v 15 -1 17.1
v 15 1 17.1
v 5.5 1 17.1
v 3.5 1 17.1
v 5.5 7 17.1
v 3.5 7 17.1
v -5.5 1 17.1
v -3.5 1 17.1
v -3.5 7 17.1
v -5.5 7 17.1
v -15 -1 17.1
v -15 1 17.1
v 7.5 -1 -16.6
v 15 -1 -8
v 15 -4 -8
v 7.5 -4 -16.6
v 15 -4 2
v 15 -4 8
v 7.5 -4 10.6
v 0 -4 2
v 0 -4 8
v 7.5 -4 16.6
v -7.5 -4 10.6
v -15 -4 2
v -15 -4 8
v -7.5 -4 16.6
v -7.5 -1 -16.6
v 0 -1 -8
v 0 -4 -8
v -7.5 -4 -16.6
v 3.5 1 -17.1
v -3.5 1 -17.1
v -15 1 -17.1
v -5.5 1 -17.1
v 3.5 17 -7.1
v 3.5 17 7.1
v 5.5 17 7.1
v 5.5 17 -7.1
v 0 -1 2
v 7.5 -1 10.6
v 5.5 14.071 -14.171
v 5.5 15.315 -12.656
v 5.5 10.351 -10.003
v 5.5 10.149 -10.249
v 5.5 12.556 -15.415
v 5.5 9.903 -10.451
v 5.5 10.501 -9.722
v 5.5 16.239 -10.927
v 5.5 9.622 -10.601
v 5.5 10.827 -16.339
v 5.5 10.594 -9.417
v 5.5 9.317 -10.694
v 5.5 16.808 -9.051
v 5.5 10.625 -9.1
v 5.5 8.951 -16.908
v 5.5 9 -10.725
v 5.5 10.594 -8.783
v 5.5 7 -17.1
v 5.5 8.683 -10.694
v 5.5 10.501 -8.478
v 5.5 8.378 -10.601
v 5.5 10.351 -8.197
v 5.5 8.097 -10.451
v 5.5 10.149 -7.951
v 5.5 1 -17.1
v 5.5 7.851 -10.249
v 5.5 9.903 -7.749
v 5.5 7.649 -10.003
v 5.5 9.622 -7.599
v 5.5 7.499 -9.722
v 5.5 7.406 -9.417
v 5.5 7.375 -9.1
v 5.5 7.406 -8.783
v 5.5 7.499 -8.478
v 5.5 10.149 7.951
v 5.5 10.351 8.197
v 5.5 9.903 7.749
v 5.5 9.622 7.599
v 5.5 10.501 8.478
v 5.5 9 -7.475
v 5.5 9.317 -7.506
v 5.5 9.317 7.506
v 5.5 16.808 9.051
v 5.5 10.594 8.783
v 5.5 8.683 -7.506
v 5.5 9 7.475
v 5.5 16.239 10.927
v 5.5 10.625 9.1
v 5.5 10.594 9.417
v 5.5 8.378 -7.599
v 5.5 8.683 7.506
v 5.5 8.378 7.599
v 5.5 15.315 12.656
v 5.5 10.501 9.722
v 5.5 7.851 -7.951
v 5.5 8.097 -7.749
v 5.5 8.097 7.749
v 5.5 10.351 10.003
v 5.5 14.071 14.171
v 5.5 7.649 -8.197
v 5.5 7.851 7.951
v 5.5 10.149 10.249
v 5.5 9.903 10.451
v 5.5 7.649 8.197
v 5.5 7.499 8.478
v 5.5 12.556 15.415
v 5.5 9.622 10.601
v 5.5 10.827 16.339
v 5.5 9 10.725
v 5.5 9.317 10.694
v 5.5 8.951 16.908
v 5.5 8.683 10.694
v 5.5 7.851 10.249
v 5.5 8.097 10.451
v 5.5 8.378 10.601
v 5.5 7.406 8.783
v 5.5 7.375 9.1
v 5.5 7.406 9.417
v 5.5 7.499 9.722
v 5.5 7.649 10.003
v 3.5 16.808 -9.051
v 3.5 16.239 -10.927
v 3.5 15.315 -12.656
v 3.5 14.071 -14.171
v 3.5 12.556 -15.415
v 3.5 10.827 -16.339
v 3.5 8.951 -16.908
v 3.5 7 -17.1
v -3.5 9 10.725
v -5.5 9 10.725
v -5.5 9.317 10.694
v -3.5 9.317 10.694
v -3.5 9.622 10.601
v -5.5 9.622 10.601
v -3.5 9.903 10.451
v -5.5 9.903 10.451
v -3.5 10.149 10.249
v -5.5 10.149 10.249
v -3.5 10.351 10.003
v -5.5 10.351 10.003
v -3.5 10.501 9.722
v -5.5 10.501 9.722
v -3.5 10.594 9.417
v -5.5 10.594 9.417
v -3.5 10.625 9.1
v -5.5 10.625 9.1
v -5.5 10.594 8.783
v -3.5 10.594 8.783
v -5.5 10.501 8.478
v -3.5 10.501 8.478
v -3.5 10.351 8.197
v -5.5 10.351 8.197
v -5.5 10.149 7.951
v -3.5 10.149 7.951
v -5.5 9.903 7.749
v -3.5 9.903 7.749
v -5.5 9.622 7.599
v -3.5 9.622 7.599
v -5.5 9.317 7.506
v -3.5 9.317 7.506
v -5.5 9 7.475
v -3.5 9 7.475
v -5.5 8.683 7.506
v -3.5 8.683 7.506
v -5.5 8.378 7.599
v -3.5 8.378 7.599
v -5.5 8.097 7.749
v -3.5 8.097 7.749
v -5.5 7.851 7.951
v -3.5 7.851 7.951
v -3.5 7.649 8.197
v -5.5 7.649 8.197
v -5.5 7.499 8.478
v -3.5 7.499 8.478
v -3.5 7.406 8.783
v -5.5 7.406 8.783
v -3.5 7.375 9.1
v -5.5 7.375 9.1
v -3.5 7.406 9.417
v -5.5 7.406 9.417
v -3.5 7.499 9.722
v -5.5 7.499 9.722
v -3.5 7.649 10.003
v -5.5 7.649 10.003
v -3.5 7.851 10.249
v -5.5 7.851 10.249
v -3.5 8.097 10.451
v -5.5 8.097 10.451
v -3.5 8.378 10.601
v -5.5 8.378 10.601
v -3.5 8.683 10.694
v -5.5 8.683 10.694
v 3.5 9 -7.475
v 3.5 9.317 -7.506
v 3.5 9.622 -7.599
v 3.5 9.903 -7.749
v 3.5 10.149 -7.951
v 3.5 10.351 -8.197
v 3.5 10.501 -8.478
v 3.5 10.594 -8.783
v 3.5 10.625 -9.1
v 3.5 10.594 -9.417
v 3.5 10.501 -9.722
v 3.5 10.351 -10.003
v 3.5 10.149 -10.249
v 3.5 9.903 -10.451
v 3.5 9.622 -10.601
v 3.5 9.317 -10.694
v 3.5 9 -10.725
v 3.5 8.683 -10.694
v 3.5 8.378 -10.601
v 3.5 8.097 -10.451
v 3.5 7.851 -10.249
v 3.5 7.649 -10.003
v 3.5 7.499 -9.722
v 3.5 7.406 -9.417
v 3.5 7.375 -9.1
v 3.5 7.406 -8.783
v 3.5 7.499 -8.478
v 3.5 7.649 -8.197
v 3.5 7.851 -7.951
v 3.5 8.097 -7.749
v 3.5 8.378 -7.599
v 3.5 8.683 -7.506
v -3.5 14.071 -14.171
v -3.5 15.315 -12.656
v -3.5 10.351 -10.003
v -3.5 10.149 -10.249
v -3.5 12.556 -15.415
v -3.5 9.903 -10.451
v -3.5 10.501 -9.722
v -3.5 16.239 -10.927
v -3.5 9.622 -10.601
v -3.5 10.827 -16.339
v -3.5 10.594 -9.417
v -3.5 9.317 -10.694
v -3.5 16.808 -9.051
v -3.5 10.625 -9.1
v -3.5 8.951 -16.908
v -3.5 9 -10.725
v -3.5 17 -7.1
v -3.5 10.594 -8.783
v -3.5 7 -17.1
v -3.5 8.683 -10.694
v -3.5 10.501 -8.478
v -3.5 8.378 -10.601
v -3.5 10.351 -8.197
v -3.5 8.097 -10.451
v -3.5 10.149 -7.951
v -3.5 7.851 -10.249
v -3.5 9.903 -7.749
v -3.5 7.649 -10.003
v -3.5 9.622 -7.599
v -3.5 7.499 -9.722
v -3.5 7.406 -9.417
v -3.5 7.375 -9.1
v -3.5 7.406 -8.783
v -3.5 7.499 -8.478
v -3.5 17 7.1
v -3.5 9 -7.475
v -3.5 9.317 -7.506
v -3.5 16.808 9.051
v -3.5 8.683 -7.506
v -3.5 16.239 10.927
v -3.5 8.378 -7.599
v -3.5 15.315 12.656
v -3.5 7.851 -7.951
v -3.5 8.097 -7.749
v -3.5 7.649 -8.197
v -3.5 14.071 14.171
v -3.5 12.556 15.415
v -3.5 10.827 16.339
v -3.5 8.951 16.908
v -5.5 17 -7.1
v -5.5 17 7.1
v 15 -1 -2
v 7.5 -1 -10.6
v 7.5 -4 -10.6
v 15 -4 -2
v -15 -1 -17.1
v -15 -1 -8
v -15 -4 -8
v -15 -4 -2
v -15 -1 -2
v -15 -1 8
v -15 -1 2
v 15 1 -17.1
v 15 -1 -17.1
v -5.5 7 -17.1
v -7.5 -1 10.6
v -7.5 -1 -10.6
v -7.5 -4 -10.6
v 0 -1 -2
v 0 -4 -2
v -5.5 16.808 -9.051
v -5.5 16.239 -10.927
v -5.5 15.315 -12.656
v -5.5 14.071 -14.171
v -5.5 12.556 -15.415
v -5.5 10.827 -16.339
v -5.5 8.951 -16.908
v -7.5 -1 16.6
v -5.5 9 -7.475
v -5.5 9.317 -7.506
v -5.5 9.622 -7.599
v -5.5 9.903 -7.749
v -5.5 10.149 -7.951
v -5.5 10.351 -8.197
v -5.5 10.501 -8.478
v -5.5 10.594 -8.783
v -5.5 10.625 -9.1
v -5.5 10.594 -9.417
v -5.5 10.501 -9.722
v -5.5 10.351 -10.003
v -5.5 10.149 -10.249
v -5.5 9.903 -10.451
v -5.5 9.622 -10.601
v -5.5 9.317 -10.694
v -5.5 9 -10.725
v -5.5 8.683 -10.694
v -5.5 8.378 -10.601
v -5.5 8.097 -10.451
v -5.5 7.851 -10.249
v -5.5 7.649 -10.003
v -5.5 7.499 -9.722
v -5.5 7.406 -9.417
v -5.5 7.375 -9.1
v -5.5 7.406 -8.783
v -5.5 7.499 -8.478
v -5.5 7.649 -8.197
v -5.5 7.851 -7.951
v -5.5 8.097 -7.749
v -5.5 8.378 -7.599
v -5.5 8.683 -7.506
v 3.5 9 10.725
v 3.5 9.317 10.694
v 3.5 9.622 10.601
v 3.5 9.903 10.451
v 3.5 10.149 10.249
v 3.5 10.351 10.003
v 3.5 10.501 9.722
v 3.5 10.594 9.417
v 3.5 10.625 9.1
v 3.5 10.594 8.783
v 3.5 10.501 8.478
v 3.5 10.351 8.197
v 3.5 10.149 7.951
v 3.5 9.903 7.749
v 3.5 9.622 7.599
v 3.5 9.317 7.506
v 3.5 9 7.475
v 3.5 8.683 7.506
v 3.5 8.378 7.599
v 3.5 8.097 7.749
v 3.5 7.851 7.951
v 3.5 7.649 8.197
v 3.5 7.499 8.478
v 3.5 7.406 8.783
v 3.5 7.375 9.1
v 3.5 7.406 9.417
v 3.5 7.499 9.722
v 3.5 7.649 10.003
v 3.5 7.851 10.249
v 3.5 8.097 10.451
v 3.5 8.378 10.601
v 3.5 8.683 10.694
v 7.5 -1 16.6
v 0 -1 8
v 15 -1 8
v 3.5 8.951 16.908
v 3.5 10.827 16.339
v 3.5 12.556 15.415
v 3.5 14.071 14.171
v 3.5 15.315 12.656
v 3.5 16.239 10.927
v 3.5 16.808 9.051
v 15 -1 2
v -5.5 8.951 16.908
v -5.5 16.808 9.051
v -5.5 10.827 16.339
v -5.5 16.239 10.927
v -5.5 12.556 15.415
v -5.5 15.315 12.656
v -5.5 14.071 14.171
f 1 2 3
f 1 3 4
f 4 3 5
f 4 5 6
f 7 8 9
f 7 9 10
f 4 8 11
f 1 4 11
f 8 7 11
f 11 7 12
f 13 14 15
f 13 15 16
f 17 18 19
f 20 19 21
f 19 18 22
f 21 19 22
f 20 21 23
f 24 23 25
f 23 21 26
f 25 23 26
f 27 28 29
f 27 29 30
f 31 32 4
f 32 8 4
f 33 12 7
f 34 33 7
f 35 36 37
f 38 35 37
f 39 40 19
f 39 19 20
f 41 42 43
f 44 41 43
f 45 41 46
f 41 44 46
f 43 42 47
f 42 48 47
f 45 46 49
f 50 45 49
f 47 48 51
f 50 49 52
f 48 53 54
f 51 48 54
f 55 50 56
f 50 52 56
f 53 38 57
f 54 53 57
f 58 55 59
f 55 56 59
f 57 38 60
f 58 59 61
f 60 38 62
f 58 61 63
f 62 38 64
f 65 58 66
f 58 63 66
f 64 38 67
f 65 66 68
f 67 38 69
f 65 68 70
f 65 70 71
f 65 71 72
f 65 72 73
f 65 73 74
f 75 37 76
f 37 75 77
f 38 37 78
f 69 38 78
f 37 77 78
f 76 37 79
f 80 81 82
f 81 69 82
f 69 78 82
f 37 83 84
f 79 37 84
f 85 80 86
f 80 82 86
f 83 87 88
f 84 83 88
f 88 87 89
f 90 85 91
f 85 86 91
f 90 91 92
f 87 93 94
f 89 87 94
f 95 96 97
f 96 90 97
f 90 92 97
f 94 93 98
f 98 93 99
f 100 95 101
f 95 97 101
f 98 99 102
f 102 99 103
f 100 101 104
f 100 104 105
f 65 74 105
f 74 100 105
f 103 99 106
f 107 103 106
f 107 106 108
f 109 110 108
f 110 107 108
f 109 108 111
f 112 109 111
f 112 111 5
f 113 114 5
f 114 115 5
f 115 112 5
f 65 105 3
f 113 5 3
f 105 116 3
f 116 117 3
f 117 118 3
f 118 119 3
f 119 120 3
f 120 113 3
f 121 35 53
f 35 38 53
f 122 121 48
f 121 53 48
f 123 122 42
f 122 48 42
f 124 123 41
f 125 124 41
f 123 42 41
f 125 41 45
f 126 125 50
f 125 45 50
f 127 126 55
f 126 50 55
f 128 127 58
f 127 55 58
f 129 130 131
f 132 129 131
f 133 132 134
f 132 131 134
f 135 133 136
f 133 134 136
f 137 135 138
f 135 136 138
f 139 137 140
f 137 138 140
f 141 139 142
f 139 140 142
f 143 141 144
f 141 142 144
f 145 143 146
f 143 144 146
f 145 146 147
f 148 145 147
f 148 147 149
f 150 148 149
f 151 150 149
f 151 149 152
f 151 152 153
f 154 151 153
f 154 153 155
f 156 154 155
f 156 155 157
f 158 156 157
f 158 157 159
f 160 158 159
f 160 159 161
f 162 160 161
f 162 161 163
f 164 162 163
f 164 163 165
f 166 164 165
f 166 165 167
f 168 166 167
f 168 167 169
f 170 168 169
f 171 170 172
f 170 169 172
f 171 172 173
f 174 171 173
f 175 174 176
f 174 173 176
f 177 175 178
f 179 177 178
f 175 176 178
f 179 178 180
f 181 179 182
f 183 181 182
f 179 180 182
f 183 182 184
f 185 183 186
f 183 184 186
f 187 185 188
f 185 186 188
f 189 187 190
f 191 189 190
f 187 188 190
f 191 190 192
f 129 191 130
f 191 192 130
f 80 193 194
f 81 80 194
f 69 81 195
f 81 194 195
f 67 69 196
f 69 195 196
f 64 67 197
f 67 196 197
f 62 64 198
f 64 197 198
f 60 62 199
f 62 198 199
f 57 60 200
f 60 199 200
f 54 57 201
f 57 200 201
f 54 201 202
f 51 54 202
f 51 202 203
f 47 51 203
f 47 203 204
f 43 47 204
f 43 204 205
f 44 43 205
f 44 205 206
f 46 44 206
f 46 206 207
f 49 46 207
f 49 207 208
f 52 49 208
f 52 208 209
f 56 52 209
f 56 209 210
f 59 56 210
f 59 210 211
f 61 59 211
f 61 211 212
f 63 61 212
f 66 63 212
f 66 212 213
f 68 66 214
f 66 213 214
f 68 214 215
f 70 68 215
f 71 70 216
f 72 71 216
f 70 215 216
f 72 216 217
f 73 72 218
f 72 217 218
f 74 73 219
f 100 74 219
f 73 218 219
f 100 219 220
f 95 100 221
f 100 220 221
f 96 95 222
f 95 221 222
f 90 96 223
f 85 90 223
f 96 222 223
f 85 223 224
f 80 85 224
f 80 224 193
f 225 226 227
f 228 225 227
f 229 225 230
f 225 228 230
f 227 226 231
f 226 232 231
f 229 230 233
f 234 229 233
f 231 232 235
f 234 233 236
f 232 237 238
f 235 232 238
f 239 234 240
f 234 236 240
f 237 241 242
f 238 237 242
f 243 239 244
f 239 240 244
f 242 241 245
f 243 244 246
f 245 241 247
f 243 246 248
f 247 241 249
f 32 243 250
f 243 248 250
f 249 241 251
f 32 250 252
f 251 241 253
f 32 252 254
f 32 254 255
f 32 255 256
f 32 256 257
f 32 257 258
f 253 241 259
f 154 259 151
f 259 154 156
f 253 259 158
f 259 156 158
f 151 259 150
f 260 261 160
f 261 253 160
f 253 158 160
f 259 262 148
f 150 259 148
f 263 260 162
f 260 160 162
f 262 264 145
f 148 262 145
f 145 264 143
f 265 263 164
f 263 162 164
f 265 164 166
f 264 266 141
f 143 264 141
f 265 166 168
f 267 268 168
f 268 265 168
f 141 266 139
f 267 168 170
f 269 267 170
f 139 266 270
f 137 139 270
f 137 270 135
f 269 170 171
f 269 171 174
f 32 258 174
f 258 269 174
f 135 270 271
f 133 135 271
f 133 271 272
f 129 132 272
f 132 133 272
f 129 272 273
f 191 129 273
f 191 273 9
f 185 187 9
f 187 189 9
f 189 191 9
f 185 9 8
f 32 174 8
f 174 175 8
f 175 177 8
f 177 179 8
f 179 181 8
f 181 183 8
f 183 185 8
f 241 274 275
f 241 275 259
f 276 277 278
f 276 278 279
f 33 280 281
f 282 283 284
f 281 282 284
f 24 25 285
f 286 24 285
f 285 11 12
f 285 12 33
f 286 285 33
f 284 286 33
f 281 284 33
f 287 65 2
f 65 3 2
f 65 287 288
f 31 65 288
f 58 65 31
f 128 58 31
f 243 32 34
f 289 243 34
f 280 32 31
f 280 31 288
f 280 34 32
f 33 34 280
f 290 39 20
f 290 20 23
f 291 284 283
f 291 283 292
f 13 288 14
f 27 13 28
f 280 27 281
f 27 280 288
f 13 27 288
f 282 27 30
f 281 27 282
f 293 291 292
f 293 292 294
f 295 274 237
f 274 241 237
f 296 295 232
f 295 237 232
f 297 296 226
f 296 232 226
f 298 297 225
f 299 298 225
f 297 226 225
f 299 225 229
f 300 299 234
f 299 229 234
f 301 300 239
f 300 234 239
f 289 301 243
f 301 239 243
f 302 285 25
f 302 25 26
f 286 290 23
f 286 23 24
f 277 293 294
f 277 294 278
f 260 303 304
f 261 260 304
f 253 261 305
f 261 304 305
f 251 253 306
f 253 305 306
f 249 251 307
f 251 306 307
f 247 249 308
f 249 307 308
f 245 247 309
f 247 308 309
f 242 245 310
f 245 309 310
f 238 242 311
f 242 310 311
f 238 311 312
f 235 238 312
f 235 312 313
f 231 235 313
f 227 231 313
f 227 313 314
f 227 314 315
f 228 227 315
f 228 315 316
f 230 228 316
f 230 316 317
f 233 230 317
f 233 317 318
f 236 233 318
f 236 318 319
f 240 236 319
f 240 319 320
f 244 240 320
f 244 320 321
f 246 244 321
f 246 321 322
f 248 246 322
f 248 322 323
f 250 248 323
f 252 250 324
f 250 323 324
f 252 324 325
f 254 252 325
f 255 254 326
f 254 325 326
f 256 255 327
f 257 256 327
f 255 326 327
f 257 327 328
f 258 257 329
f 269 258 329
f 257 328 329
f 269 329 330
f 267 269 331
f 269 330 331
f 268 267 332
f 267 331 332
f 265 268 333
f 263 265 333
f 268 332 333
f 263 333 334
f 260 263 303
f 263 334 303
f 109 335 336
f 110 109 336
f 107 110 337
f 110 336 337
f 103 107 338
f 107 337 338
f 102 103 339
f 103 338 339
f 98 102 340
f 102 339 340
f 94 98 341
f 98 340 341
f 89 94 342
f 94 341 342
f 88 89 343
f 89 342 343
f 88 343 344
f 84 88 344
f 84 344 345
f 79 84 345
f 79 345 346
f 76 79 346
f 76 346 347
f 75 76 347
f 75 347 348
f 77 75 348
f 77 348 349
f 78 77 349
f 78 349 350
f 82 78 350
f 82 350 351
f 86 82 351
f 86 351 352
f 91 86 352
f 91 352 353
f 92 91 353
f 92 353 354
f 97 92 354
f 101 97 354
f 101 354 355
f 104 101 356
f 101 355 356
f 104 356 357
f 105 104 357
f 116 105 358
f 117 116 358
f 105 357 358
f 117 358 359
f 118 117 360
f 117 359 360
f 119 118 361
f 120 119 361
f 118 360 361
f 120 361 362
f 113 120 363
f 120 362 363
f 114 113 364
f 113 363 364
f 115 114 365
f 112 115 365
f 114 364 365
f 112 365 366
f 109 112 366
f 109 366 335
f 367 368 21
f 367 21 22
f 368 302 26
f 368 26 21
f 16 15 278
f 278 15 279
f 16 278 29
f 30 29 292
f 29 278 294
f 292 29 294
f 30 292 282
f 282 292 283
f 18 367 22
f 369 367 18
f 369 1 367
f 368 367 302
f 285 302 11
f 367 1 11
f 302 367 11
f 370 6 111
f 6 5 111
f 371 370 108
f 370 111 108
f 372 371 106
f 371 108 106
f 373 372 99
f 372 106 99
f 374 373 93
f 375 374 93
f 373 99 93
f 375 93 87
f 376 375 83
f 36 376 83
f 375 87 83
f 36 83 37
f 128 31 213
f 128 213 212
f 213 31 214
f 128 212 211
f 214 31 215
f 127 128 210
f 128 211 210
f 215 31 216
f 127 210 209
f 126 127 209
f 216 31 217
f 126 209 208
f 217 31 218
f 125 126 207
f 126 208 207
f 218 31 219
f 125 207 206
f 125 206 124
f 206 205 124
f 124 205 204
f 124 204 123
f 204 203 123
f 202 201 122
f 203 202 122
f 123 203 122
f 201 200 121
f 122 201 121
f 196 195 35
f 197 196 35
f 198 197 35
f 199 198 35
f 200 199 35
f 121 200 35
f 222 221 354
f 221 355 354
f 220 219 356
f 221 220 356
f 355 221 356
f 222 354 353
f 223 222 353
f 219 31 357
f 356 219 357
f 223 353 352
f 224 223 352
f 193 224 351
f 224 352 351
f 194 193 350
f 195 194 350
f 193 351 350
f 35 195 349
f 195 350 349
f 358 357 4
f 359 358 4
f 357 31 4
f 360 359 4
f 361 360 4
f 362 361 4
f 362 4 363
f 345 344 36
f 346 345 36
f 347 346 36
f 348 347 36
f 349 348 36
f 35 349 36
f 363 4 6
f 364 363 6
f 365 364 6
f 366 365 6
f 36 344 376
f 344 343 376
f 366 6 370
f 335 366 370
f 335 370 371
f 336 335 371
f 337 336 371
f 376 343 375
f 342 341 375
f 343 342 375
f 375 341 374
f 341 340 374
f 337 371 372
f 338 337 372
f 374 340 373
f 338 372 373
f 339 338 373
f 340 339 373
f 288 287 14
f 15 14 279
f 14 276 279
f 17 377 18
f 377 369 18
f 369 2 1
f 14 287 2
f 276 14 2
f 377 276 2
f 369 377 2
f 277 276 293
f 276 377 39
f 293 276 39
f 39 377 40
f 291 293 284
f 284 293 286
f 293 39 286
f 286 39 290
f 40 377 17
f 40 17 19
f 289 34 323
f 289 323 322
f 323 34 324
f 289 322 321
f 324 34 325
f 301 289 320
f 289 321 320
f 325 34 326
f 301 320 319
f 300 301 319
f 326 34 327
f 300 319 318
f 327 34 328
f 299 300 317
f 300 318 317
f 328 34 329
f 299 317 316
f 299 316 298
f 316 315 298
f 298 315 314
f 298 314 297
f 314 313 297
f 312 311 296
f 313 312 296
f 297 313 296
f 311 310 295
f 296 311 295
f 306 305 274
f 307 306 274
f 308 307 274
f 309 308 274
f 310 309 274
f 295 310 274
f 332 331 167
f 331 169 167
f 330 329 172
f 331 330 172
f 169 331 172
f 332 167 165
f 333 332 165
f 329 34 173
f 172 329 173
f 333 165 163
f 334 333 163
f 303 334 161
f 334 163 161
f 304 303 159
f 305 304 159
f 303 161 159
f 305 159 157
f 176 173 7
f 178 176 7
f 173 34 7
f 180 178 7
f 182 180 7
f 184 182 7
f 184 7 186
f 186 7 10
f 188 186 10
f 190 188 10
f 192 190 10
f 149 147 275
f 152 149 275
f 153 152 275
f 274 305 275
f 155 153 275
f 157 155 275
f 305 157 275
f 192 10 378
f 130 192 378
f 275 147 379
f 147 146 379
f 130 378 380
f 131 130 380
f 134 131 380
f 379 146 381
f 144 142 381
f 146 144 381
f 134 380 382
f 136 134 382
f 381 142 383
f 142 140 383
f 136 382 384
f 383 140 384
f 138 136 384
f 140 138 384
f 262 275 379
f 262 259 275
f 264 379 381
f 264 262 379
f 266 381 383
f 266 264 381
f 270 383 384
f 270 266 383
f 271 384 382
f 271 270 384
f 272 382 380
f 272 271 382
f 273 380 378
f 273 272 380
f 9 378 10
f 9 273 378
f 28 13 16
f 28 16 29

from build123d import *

# Parameters (mm, degrees)
BOSS_EXTRUDE1_DEPTH = 17.1
FILLET1_R           = 10
SKETCH5_R           = 1.625
CUT_EXTRUDE1_DEPTH  = 21.5
BOSS_EXTRUDE2_DEPTH = 3


with BuildPart() as part:
    # Sketch1 → Boss-Extrude1 (new body, symmetric)
    with BuildSketch(Plane.XY):
        Polygon((-5.5, 17), (-3.5, 17), (-3.5, 1), (3.5, 1), (3.5, 17), (5.5, 17), (5.5, 1), (15, 1), (15, -1), (-15, -1), (-15, 1), (-5.5, 1), align=None)
    extrude(amount=BOSS_EXTRUDE1_DEPTH, both=True)

    # Fillet1
    fillet1_edges = [part.edges().sort_by_distance(p)[0] for p in [
        (-4.5, 17, -17.1),
        (4.5, 17, -17.1),
        (4.5, 17, 17.1),
        (-4.5, 17, 17.1),
    ]]
    fillet(fillet1_edges, radius=FILLET1_R)

    # Sketch5 → Cut-Extrude1 (cut, through all)
    with BuildSketch(Plane.ZY.offset(5.5)):
        with Locations((-9.1, 9)):
            Circle(SKETCH5_R)
        with Locations((9.1, 9)):
            Circle(SKETCH5_R)
    extrude(amount=-CUT_EXTRUDE1_DEPTH, mode=Mode.SUBTRACT)

    # Sketch7 → Boss-Extrude2 (add)
    with BuildSketch(Plane.XZ.offset(1)):
        Polygon((-15, 8), (-7.5, 16.6), (0, 8), (7.5, 16.6), (15, 8), (15, 2), (7.5, 10.6), (0, 2), (-7.5, 10.6), (-15, 2), align=None)
        Polygon((-15, -2), (-7.5, -10.6), (0, -2), (7.5, -10.6), (15, -2), (15, -8), (7.5, -16.6), (0, -8), (-7.5, -16.6), (-15, -8), align=None)
    extrude(amount=BOSS_EXTRUDE2_DEPTH)


solid = part.part
